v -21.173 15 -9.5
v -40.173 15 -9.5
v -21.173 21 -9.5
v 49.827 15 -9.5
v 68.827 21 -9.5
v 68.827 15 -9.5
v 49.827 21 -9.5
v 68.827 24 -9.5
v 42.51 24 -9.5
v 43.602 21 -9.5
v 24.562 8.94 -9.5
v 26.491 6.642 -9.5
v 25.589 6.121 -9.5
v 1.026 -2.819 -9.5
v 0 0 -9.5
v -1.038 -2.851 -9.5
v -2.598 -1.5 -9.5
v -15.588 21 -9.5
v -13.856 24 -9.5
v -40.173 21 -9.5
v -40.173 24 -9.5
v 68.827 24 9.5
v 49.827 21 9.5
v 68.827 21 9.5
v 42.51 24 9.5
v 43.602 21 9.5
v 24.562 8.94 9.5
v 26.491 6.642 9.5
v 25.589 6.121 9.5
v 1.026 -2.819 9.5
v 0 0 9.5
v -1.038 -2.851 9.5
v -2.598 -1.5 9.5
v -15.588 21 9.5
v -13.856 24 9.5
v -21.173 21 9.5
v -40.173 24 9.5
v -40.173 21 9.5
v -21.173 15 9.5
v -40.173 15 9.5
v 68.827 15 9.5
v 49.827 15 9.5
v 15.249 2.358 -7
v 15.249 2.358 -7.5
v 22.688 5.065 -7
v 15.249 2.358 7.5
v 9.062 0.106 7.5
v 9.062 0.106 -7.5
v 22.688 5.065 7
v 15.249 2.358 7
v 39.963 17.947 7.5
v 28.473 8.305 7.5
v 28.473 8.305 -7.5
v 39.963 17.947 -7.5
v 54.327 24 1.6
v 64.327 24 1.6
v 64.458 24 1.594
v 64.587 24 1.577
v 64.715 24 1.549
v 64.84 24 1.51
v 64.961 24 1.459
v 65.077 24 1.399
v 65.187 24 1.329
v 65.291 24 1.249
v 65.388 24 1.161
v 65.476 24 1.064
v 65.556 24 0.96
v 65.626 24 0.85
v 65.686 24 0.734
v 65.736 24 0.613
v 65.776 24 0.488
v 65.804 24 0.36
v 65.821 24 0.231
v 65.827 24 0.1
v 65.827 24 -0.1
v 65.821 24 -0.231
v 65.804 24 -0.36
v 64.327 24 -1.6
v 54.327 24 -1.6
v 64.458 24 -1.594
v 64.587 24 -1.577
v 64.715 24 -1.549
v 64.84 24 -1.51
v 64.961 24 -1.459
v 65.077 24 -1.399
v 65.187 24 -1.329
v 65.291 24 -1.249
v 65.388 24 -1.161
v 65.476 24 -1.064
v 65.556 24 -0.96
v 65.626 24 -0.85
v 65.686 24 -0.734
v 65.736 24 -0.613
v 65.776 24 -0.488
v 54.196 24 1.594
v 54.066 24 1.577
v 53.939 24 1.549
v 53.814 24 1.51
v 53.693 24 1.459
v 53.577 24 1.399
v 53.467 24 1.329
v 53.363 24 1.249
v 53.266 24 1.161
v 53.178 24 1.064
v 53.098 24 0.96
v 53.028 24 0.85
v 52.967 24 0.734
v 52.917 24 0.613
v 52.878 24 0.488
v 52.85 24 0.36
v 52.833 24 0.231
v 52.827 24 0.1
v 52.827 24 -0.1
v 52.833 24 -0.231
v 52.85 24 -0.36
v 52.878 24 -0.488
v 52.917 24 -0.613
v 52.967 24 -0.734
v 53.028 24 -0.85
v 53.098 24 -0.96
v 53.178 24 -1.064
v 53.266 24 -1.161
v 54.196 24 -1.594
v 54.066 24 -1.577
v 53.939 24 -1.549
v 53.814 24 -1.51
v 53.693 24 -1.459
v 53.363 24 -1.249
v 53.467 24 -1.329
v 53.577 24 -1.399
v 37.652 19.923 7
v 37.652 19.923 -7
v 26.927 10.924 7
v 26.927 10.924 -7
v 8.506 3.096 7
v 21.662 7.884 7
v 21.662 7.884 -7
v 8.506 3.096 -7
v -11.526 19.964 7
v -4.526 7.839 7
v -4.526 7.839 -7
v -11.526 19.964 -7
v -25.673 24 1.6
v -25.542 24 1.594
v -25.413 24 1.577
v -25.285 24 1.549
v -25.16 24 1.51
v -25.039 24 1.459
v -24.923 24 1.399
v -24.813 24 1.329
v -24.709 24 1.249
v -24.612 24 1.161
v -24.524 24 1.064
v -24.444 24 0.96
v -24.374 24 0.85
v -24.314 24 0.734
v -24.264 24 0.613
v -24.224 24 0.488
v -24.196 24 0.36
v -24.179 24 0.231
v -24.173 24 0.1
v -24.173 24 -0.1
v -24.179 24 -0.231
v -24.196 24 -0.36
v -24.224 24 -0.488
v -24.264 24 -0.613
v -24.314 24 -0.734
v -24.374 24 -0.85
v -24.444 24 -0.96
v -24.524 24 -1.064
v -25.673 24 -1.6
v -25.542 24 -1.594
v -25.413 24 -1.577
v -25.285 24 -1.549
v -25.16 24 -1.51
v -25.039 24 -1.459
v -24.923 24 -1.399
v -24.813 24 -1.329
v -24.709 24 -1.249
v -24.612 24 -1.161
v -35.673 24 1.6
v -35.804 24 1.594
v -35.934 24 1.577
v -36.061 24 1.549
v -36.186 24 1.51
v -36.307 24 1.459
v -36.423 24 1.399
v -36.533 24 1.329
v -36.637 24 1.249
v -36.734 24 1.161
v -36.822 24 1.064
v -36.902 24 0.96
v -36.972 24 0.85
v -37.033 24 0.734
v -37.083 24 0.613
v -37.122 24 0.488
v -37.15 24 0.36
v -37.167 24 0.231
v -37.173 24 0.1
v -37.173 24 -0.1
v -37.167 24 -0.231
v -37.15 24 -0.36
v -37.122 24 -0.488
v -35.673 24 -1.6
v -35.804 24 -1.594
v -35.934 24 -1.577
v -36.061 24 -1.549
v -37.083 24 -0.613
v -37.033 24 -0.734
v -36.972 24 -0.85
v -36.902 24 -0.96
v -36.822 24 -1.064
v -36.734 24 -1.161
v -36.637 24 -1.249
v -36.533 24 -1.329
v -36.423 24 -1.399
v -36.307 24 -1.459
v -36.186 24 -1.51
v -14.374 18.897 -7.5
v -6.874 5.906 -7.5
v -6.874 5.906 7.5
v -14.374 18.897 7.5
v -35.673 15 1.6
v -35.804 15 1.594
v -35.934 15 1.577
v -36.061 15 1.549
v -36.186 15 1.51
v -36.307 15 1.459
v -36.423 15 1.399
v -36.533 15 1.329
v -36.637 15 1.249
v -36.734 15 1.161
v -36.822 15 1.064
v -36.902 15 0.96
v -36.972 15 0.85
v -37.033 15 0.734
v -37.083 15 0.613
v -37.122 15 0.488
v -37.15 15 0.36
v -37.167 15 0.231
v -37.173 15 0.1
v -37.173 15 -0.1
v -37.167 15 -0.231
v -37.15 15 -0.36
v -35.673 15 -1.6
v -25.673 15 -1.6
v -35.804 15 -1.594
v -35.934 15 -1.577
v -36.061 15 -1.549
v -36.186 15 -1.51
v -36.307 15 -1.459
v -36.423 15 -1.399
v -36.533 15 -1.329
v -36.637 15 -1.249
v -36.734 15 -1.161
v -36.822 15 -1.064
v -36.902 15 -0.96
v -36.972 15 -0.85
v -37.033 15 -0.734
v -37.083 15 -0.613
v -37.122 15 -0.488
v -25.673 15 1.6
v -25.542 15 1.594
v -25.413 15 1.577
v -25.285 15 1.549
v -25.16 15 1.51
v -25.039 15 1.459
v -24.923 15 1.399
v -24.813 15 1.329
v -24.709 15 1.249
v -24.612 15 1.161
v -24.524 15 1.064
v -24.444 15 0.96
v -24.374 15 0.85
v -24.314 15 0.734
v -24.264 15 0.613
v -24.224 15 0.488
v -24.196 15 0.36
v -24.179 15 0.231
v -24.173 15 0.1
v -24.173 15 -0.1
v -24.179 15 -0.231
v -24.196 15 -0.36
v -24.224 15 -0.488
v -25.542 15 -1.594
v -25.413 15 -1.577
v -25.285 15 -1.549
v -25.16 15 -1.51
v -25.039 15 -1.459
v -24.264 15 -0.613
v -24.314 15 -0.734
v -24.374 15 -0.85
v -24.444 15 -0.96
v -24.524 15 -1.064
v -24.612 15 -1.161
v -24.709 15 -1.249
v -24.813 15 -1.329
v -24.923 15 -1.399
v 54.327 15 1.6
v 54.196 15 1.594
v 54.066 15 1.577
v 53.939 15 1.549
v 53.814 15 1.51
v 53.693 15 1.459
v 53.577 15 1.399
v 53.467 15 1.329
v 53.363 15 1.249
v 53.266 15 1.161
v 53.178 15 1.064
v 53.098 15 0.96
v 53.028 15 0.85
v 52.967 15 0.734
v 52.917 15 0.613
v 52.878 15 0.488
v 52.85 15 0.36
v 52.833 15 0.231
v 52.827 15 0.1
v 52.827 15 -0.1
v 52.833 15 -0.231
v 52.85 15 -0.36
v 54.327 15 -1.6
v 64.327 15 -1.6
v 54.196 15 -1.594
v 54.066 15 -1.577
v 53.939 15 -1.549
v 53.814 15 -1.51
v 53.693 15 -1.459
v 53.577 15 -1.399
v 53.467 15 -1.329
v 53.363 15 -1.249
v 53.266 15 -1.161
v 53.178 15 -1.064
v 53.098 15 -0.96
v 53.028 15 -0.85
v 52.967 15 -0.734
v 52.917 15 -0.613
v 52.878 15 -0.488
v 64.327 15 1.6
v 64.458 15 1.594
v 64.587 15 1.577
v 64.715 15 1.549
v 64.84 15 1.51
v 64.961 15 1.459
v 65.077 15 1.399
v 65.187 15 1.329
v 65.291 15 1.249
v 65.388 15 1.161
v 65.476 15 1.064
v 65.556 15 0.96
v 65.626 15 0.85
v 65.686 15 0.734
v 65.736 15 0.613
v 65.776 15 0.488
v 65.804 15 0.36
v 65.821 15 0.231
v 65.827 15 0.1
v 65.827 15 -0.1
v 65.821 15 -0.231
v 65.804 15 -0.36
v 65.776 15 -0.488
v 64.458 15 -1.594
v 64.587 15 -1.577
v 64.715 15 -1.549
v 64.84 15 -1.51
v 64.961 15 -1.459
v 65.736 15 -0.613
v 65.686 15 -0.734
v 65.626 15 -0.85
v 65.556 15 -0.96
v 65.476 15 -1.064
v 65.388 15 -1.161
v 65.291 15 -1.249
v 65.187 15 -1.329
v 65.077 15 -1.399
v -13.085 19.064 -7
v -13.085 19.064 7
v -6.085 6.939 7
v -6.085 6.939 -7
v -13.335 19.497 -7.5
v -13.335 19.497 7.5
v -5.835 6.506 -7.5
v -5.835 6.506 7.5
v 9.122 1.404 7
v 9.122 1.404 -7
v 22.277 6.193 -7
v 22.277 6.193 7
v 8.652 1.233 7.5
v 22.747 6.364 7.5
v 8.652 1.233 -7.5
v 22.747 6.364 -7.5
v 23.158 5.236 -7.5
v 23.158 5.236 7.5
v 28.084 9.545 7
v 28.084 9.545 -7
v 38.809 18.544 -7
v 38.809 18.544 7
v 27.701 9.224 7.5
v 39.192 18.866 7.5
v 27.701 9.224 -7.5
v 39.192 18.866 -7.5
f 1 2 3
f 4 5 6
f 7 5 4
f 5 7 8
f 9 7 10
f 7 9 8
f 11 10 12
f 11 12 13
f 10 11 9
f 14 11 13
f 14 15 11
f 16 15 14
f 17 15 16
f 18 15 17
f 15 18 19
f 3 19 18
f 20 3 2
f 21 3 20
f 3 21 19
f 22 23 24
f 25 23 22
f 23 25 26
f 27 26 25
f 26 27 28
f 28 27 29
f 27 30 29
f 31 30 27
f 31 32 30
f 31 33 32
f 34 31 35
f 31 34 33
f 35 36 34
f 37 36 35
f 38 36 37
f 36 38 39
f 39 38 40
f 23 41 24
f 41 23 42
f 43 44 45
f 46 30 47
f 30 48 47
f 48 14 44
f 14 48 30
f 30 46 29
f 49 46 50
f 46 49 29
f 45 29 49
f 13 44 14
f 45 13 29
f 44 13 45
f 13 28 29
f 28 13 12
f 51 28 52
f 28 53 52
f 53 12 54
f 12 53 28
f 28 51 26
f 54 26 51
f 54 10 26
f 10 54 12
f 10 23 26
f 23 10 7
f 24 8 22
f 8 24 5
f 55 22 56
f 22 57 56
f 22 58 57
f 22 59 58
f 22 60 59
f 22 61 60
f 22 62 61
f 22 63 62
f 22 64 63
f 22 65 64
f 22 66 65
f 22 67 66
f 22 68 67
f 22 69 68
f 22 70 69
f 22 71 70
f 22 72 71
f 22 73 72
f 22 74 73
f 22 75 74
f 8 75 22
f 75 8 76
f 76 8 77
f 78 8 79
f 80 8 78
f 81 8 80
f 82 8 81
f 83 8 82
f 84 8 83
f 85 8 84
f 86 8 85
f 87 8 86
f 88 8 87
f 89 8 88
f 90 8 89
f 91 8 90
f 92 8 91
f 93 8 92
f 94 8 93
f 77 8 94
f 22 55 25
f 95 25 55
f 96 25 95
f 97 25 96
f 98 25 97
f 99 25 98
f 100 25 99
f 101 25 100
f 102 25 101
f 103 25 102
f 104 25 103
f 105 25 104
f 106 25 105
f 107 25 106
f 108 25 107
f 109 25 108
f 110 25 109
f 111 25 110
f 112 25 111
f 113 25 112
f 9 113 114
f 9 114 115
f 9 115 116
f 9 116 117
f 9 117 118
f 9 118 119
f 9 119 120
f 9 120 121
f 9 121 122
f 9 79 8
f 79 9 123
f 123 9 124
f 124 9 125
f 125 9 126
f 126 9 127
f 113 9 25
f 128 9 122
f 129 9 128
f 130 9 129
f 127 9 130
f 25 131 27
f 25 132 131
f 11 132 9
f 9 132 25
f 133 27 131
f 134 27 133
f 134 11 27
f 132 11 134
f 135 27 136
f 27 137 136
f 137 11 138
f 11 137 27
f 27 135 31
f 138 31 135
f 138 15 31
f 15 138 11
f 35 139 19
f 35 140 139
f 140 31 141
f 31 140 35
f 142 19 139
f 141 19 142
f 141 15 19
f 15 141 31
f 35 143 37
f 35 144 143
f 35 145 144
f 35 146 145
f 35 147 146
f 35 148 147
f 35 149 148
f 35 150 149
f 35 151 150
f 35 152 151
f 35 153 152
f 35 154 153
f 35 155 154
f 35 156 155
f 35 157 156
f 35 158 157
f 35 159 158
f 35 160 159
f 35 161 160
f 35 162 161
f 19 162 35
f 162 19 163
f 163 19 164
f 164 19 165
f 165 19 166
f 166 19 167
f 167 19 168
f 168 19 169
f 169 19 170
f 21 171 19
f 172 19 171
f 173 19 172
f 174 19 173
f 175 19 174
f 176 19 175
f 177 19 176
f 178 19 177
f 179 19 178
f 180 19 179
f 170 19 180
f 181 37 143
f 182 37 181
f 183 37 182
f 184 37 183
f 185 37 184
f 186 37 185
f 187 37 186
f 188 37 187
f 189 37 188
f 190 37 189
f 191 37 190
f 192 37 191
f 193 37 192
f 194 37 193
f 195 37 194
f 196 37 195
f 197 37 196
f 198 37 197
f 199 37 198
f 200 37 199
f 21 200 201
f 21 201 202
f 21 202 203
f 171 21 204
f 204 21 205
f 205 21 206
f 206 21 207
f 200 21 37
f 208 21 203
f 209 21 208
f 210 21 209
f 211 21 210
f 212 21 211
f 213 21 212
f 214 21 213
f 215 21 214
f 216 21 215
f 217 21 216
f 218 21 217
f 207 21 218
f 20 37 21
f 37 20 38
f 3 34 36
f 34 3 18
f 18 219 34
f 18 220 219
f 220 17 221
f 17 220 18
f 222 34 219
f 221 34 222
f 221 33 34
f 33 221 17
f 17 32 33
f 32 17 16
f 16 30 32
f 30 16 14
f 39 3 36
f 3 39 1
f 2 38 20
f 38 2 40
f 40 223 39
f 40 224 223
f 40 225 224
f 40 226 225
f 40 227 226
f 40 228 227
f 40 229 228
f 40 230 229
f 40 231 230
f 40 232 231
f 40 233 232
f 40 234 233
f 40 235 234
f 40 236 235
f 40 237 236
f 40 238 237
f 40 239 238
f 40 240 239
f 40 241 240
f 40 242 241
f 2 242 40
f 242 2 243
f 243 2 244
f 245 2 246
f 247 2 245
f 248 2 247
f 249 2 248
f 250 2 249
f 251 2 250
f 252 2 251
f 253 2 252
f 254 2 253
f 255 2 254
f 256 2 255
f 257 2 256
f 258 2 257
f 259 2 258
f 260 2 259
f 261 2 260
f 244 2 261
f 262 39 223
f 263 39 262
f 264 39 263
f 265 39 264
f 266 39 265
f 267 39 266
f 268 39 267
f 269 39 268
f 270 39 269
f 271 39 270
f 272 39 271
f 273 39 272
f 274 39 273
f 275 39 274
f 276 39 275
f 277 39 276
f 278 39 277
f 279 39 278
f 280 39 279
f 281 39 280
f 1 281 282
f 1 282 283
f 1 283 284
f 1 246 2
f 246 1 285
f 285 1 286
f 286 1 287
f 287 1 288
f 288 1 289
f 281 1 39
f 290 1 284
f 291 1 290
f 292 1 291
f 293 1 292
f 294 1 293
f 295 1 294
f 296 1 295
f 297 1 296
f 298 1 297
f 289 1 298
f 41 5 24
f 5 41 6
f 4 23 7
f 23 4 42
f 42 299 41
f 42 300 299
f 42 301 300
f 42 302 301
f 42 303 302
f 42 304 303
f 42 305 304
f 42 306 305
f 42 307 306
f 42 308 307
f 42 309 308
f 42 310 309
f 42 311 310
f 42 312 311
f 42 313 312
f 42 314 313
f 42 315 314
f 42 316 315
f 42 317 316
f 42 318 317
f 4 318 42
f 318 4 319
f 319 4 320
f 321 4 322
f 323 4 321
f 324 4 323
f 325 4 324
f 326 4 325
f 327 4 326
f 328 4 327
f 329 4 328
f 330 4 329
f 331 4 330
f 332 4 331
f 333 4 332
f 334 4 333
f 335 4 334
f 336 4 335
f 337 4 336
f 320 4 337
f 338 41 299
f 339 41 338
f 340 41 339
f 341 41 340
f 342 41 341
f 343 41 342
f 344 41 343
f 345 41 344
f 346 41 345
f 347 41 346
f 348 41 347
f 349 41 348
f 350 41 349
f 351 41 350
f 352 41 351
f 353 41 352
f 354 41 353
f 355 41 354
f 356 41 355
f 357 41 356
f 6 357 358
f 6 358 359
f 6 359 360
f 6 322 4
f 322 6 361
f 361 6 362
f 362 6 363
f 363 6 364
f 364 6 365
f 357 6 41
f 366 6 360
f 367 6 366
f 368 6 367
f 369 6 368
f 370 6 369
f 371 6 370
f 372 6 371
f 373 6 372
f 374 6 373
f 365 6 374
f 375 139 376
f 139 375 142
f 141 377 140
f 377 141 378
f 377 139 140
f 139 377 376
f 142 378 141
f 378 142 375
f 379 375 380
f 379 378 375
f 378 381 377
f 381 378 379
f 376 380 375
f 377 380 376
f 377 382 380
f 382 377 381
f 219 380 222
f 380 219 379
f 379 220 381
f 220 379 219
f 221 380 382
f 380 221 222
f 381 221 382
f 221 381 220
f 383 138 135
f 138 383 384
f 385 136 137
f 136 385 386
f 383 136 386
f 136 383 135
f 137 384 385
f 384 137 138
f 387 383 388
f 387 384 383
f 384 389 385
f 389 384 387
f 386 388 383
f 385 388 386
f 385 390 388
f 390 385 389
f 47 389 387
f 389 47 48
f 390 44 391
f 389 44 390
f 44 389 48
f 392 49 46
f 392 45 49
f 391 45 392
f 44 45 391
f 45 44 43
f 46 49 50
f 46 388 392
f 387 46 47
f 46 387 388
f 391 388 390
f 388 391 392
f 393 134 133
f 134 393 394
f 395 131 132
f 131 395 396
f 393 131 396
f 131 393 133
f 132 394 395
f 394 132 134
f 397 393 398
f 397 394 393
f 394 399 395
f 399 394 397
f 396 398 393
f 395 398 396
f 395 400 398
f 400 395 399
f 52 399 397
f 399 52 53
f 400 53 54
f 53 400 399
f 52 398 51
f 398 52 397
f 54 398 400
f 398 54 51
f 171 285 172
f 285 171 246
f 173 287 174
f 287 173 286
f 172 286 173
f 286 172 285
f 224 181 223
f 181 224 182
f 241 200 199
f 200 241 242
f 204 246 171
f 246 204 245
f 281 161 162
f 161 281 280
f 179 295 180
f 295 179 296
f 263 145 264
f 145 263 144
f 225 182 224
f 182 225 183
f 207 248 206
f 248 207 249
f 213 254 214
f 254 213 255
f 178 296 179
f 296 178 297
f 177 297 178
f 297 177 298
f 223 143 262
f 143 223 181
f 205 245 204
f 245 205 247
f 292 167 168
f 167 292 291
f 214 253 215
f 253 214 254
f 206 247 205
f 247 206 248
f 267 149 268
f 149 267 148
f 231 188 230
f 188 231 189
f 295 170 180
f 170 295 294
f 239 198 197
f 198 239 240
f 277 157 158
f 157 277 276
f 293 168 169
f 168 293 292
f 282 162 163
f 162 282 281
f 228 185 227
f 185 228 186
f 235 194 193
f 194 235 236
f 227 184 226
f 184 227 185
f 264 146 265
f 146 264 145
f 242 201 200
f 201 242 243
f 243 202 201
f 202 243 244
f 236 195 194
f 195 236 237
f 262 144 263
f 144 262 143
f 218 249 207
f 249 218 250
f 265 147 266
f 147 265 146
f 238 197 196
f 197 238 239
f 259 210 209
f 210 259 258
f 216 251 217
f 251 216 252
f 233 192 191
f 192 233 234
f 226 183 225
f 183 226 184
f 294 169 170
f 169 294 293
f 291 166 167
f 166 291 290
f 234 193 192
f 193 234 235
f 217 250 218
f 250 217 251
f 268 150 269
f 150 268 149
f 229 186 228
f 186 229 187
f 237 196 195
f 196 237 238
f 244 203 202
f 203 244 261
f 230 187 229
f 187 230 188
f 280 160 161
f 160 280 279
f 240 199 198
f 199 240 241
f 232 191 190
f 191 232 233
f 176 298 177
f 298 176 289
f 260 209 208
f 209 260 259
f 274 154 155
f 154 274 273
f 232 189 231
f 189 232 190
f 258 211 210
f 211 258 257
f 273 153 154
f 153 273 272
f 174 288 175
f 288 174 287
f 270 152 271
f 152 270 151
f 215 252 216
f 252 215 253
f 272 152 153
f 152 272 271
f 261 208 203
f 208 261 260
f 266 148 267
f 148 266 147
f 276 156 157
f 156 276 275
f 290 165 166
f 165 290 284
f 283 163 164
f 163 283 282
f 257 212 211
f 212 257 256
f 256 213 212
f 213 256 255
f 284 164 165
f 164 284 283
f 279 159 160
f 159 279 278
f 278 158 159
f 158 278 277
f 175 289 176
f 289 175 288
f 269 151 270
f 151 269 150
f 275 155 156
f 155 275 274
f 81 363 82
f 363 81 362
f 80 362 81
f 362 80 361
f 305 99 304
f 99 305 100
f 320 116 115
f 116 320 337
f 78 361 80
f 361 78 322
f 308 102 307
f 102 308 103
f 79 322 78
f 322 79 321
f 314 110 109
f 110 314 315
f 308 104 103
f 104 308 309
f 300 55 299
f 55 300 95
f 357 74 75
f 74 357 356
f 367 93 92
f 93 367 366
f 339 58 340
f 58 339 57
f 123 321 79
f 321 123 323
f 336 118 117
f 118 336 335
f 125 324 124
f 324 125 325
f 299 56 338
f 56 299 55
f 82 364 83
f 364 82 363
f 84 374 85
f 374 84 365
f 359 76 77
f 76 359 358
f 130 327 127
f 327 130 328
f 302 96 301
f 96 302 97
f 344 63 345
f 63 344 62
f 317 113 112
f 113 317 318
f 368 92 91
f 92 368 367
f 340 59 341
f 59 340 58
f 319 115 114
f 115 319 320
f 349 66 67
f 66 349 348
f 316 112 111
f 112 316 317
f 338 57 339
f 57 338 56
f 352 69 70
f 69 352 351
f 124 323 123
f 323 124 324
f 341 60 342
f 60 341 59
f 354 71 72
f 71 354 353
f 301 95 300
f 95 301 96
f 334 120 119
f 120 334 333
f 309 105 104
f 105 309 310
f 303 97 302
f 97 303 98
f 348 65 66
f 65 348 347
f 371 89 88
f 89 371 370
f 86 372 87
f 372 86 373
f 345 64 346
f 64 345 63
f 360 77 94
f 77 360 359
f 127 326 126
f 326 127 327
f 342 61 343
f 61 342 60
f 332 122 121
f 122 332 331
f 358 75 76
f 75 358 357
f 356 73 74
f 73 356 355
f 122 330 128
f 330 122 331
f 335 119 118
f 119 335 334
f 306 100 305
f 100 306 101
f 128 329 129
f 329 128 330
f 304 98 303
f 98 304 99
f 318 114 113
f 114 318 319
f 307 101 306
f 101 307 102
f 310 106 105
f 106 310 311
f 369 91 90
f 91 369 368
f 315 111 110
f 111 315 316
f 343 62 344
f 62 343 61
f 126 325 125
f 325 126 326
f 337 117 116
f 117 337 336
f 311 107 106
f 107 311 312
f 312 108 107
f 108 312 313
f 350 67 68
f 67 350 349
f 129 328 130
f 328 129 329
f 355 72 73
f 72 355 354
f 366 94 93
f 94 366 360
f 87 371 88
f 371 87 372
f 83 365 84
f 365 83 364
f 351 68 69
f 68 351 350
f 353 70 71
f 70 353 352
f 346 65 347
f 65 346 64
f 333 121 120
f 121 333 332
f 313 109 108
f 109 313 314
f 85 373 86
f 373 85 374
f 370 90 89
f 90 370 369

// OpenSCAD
$fn         = 72;

WIDTH       = 114-5;
MOUNT_WIDTH = 90;
SPACING     = 80;
// =======================================================================================================
PAD_THICK   = 6;    // test values: 0, 2, 4, 6 
PAD_WIDTH   = 19;
PAD_OFFSET  = (WIDTH - PAD_WIDTH)/2;
// =======================================================================================================
HEIGHT      = 19;
THICK       = 3;
PLATE       = 1.8;
DIG         = THICK - PLATE;

SW_M_S      = 14; // Switch mount size is 14x14 mm
SW_M_SPC    = 15; // Switch mount size is 14x14 mm + 0.5 mm space

SS          = 17; // (Horizontal) Area occupied by the switch - compact placement, for keycaps 17.7 x 16.7
SH          = 9;  // (Vertical)   Area occupied by the switch and keycap

MOUNT_CUT_H = 13;

// P: point
// A: angle
//
//
//    PS                          P2                                      P3                                        PF
//    *-------------------------*                                            *-------------------------------------*
//                            A2 \                                         _/ A3
//                                \                                   P31_*
//    *--------------------\       * P20                    A1         _/         *--------------------------------*
//    PBS             PB2   \       \                            P13 _*         _/|  PB3                           PBF
//                         | \       \         A0                  _/         _/  |
//                         |  \  PCA  \                       ____* P1      _/ A31|
//                         |   \       * P02             ____*            _/ A13  |
//                         |A20 \       \       *   ____/   P10          *  PB13 ------------
//                         |     \       \     __*/             ____*         
//                         |      \       \_/    P01       ____/    |  PB10
//                                 \       *          ____/      A10|
//                              A02 \     P0    _____/     A01      |
//                         __________*   *   *_____________________ 
//                                        
//                                  PB02 PB00  PB01
//

A20         = 30;
A02         = 90 - A20;
A01         = 20;
A10         = 90 - A01;
A13         = 40;
A31         = 90 - A13;

A0          = 180 - A02 - A01;
A1          = 180 - (A13 - A01);
A2          = 180 - A02;
A3          = 180 - A13;

D_P0        = SH / tan(A0/2);       // distance from P0 to any switch cutout
D_P1        = SH / tan(A1/2);       // distance from P1 to any switch cutout

P0_X        = 0;
P0_Y        = 0;
TOP_Y       = 24;
TOP_CENT_Y  = TOP_Y - THICK/2;

P02_X       = P0_X - D_P0*sin(A20);
P02_Y       = P0_Y + D_P0*cos(A20);
P20_X       = P02_X - SS*sin(A20);
P20_Y       = P02_Y + SS*cos(A20);
P2_Y        = TOP_Y;
P2_X        = P20_X - (P2_Y-P20_Y)*tan(A20);

P01_X       = P0_X + D_P0*cos(A01);
P01_Y       = P0_Y + D_P0*sin(A01);
P10_X       = P01_X + SS*cos(A01);
P10_Y       = P01_Y + SS*sin(A01);
P1_X        = P10_X + D_P1*cos(A01);
P1_Y        = P10_Y + D_P1*sin(A01);

P13_X       = P1_X + D_P1*cos(A13);
P13_Y       = P1_Y + D_P1*sin(A13);
P31_X       = P13_X + SS*cos(A13);
P31_Y       = P13_Y + SS*sin(A13);
P3_Y        = TOP_Y;
P3_X        = P31_X + (P3_Y-P31_Y)*tan(A31);
// =========================================================================
D_P2_P3     = P3_X - P2_X;
EXTRA_X     = (WIDTH - D_P2_P3) / 2;

PS_X        = P2_X - EXTRA_X;
PS_Y        = TOP_Y; 

PBS_X       = PS_X;
PBS_Y       = PS_Y - THICK; 

PB2_X       = P2_X - THICK/tan(A2/2);
PB2_Y       = PBS_Y;

PF_X        = P3_X + EXTRA_X;
PF_Y        = TOP_Y;
PBF_X       = PF_X;
PBF_Y       = PF_Y - THICK;

PB3_X       = P3_X + THICK/tan(A3/2);
PB3_Y       = PBF_Y;

CENTER_X    = (PS_X + PF_X)/2;
// =========================================================================

PB02_X      = P0_X - THICK*cos(A20);
PB02_Y      = P0_Y - THICK*sin(A20);

PB01_X      = P0_X + THICK*sin(A01);
PB01_Y      = P0_Y - THICK*cos(A01);

PB00_X      = 0.66*(PB02_X + PB01_X) - P0_X;
PB00_Y      = 0.66*(PB02_Y + PB01_Y) - P0_Y;

PB10_X      = P1_X + THICK*sin(A01);
PB10_Y      = P1_Y - THICK*cos(A01);

PB13_X      = P1_X + THICK*sin(A13);
PB13_Y      = P1_Y - THICK*cos(A13);


PCA_X       = (P02_X + P20_X)/2; // center of switch A cutout
PCA_Y       = (P02_Y + P20_Y)/2; // center of switch A cutout
PCB_X       = (P01_X + P10_X)/2; // center of switch B cutout
PCB_Y       = (P01_Y + P10_Y)/2; // center of switch B cutout
PCC_X       = (P13_X + P31_X)/2; // center of switch C cutout
PCC_Y       = (P13_Y + P31_Y)/2; // center of switch C cutout


outline_points = concat(
[ [PB3_X,   PB3_Y   ] ],
[ [PBF_X,   PBF_Y   ] ],
[ [PF_X,    PF_Y    ] ],
[ [P3_X,    P3_Y    ] ],
[ [P1_X,    P1_Y    ] ],
[ [P0_X,    P0_Y    ] ],
[ [P2_X,    P2_Y    ] ],
[ [PS_X,    PS_Y    ] ],
[ [PBS_X,   PBS_Y   ] ],
[ [PB2_X,   PB2_Y   ] ],
[ [PB02_X,  PB02_Y  ] ],
[ [PB00_X,  PB00_Y  ] ],
[ [PB01_X,  PB01_Y  ] ],
[ [PB10_X,  PB10_Y  ] ],
[ [PB13_X,  PB13_Y  ] ]
);

module pad() {
  translate([0, TOP_Y - THICK - PAD_THICK/2, 0])
  color("blue") cube([PAD_WIDTH, PAD_THICK, HEIGHT], center=true);
}

module raw_part() {
  union() {
    translate([0, 0, -HEIGHT/2]) linear_extrude(height = HEIGHT) polygon(outline_points);
    translate([CENTER_X - PAD_OFFSET, 0, 0]) pad();
    translate([CENTER_X + PAD_OFFSET, 0, 0]) pad();
  }
}


module switch_cutout() {
  union() {  
    rotate([90, 0, 0])
    color("red")
    cube([SW_M_S, SW_M_S, THICK*3], center=true);

    rotate([-90, 0, 0])
    color("red")
    translate([0, 0, -DIG/2 - PLATE]) 
    cube([SW_M_SPC, SW_M_SPC, DIG], center=true);
  }
}

module mounting_cutout() { 
  color("red")
  rotate([90, 0, 0])
  linear_extrude(height = MOUNT_CUT_H) offset(r=1.5) polygon([ [-5, -0.1], [-5, 0.1], [5, 0.1], [5, -0.1] ]);
}


module part() {
  difference() {
    raw_part();   
    
    translate([PCA_X, PCA_Y, 0]) rotate([0, 0, -A02]) switch_cutout();
    translate([PCB_X, PCB_Y, 0]) rotate([0, 0, +A01]) switch_cutout();
    translate([PCC_X, PCC_Y, 0]) rotate([0, 0, +A13]) switch_cutout();
    
    translate([CENTER_X - MOUNT_WIDTH/2, TOP_Y, 0]) mounting_cutout();
    translate([CENTER_X + MOUNT_WIDTH/2, TOP_Y, 0]) mounting_cutout();
  }
}

part();
